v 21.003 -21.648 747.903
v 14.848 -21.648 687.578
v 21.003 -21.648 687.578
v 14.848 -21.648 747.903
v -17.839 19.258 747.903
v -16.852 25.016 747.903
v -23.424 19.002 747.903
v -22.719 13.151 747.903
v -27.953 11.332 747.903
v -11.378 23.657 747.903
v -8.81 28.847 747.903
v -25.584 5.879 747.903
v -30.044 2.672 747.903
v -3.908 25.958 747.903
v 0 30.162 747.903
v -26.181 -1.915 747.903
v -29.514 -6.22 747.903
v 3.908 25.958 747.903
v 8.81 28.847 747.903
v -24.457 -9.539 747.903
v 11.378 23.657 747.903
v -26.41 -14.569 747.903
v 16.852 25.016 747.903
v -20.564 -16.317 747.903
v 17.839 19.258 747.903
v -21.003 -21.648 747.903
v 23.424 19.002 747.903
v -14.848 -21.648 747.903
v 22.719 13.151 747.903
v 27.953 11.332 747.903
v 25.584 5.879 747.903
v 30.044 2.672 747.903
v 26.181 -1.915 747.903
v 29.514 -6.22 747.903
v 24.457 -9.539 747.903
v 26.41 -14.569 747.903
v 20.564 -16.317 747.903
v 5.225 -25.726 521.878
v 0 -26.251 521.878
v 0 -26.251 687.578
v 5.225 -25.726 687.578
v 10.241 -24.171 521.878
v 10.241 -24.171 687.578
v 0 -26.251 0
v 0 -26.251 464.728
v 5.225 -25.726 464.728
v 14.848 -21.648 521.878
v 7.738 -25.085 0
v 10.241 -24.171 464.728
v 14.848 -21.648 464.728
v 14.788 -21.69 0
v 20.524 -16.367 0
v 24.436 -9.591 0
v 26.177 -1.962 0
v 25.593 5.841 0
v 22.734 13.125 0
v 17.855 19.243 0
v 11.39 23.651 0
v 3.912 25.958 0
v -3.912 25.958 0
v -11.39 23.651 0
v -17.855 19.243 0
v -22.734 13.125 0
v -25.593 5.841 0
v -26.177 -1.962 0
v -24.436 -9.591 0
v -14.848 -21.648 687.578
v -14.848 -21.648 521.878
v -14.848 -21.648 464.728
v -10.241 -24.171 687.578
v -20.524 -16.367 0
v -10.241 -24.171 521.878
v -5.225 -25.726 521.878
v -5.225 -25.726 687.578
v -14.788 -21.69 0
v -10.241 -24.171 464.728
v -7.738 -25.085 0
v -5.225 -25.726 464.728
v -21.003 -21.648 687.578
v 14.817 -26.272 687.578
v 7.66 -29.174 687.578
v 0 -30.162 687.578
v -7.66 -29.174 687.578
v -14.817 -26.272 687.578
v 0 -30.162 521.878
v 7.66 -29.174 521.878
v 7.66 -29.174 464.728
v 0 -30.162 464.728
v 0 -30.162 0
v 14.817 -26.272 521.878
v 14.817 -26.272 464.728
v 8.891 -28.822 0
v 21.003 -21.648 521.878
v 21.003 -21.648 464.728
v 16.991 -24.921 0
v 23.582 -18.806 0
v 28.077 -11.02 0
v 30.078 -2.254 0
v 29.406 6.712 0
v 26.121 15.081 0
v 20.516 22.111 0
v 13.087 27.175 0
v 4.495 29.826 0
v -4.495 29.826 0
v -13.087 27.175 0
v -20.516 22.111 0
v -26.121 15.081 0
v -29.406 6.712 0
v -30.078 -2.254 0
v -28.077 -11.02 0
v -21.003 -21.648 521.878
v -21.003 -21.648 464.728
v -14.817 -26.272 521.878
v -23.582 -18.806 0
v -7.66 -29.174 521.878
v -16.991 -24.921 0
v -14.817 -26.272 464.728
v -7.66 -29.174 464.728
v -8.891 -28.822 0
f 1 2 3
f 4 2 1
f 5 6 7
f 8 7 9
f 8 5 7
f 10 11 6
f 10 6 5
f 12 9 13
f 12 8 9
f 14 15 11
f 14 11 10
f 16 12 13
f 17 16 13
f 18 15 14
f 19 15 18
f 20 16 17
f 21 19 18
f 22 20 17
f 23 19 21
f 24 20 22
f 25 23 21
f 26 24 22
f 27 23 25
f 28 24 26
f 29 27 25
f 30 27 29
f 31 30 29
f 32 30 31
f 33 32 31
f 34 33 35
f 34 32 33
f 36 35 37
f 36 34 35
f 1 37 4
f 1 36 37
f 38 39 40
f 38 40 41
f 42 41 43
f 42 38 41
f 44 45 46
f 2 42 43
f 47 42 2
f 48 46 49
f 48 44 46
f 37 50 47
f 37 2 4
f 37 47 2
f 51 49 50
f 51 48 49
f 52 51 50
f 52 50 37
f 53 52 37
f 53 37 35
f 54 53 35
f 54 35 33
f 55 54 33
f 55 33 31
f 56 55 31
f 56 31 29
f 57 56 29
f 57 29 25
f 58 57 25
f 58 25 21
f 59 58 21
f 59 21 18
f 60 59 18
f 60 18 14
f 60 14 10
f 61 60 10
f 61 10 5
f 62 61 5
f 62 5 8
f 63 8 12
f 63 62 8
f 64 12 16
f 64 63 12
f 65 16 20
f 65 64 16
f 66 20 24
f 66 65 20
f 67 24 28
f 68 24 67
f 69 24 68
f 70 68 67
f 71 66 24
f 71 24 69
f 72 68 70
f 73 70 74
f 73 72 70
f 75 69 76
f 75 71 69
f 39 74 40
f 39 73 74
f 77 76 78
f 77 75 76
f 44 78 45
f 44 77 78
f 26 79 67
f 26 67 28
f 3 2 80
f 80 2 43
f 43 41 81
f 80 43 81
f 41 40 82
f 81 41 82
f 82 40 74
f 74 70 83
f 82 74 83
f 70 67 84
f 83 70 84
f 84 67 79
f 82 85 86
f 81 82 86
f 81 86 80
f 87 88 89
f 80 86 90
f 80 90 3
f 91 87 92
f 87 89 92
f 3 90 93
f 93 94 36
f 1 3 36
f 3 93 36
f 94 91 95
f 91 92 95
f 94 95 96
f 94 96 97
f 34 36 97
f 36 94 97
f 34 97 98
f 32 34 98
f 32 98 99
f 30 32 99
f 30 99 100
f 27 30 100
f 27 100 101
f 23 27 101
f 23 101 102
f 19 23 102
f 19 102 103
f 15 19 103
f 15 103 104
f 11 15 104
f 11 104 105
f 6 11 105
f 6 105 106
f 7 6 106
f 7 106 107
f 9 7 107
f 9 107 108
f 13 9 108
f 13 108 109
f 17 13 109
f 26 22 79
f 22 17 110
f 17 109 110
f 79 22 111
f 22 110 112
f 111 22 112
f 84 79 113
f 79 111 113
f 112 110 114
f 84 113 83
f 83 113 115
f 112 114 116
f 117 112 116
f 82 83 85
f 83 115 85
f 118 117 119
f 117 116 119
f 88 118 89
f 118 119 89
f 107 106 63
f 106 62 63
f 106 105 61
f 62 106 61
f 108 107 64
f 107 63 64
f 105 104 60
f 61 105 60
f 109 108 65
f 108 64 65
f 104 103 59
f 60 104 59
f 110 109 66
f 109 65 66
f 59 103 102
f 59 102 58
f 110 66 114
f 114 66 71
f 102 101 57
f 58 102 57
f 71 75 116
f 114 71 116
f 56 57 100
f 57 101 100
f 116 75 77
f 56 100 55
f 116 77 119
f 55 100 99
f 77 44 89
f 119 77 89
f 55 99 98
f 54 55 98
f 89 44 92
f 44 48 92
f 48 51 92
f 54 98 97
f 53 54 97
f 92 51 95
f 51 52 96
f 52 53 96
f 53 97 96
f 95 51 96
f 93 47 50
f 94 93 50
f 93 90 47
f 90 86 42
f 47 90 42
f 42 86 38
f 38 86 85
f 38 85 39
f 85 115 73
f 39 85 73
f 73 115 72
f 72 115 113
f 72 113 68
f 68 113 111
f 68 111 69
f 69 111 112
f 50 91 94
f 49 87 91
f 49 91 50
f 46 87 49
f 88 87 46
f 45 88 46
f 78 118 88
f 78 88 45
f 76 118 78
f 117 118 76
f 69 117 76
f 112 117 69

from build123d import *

# Parameters (mm, degrees)
SKETCH1_R               = 30.1625
SKETCH1_R_2             = 26.2509
BOSS_EXTRUDE1_DEPTH     = 747.903150098
CUT_EXTRUDE1_DEPTH      = 750.11859858
CUT_EXTRUDE1_DEPTH_BACK = 750.11859858
SKETCH2_W               = 57.15
SKETCH2_H               = 19.05


with BuildPart() as part:
    # Sketch1 → Boss-Extrude1 (new body)
    with BuildSketch(Plane.XY):
        with Locations(Location((0, 0, 0), (0, 0, 270))):
            Circle(SKETCH1_R)
        with Locations(Location((0, 0, 0), (0, 0, 270))):
            Circle(SKETCH1_R_2, mode=Mode.SUBTRACT)
    extrude(amount=BOSS_EXTRUDE1_DEPTH)

    # Sketch2 → Cut-Extrude1 (cut, two sides: drawn at the far end of the back side and taken through both)
    with BuildSketch(Plane(origin=(0, 0, 0), x_dir=(0, 0, -1), z_dir=(1, 0, 0)).offset(-CUT_EXTRUDE1_DEPTH_BACK)):
        Polygon((-732.028150098, -21.648424474), (-687.578150098, -21.648424474), (-687.578150098, -40.698424474), (-732.028150098, -40.698424474), (-757.696723695, -40.698424474), (-757.696723695, -21.648424474), align=None)
        with Locations((-493.303150098, -31.173424474)):
            Rectangle(SKETCH2_W, SKETCH2_H)
    extrude(amount=CUT_EXTRUDE1_DEPTH + CUT_EXTRUDE1_DEPTH_BACK, mode=Mode.SUBTRACT)


solid = part.part
